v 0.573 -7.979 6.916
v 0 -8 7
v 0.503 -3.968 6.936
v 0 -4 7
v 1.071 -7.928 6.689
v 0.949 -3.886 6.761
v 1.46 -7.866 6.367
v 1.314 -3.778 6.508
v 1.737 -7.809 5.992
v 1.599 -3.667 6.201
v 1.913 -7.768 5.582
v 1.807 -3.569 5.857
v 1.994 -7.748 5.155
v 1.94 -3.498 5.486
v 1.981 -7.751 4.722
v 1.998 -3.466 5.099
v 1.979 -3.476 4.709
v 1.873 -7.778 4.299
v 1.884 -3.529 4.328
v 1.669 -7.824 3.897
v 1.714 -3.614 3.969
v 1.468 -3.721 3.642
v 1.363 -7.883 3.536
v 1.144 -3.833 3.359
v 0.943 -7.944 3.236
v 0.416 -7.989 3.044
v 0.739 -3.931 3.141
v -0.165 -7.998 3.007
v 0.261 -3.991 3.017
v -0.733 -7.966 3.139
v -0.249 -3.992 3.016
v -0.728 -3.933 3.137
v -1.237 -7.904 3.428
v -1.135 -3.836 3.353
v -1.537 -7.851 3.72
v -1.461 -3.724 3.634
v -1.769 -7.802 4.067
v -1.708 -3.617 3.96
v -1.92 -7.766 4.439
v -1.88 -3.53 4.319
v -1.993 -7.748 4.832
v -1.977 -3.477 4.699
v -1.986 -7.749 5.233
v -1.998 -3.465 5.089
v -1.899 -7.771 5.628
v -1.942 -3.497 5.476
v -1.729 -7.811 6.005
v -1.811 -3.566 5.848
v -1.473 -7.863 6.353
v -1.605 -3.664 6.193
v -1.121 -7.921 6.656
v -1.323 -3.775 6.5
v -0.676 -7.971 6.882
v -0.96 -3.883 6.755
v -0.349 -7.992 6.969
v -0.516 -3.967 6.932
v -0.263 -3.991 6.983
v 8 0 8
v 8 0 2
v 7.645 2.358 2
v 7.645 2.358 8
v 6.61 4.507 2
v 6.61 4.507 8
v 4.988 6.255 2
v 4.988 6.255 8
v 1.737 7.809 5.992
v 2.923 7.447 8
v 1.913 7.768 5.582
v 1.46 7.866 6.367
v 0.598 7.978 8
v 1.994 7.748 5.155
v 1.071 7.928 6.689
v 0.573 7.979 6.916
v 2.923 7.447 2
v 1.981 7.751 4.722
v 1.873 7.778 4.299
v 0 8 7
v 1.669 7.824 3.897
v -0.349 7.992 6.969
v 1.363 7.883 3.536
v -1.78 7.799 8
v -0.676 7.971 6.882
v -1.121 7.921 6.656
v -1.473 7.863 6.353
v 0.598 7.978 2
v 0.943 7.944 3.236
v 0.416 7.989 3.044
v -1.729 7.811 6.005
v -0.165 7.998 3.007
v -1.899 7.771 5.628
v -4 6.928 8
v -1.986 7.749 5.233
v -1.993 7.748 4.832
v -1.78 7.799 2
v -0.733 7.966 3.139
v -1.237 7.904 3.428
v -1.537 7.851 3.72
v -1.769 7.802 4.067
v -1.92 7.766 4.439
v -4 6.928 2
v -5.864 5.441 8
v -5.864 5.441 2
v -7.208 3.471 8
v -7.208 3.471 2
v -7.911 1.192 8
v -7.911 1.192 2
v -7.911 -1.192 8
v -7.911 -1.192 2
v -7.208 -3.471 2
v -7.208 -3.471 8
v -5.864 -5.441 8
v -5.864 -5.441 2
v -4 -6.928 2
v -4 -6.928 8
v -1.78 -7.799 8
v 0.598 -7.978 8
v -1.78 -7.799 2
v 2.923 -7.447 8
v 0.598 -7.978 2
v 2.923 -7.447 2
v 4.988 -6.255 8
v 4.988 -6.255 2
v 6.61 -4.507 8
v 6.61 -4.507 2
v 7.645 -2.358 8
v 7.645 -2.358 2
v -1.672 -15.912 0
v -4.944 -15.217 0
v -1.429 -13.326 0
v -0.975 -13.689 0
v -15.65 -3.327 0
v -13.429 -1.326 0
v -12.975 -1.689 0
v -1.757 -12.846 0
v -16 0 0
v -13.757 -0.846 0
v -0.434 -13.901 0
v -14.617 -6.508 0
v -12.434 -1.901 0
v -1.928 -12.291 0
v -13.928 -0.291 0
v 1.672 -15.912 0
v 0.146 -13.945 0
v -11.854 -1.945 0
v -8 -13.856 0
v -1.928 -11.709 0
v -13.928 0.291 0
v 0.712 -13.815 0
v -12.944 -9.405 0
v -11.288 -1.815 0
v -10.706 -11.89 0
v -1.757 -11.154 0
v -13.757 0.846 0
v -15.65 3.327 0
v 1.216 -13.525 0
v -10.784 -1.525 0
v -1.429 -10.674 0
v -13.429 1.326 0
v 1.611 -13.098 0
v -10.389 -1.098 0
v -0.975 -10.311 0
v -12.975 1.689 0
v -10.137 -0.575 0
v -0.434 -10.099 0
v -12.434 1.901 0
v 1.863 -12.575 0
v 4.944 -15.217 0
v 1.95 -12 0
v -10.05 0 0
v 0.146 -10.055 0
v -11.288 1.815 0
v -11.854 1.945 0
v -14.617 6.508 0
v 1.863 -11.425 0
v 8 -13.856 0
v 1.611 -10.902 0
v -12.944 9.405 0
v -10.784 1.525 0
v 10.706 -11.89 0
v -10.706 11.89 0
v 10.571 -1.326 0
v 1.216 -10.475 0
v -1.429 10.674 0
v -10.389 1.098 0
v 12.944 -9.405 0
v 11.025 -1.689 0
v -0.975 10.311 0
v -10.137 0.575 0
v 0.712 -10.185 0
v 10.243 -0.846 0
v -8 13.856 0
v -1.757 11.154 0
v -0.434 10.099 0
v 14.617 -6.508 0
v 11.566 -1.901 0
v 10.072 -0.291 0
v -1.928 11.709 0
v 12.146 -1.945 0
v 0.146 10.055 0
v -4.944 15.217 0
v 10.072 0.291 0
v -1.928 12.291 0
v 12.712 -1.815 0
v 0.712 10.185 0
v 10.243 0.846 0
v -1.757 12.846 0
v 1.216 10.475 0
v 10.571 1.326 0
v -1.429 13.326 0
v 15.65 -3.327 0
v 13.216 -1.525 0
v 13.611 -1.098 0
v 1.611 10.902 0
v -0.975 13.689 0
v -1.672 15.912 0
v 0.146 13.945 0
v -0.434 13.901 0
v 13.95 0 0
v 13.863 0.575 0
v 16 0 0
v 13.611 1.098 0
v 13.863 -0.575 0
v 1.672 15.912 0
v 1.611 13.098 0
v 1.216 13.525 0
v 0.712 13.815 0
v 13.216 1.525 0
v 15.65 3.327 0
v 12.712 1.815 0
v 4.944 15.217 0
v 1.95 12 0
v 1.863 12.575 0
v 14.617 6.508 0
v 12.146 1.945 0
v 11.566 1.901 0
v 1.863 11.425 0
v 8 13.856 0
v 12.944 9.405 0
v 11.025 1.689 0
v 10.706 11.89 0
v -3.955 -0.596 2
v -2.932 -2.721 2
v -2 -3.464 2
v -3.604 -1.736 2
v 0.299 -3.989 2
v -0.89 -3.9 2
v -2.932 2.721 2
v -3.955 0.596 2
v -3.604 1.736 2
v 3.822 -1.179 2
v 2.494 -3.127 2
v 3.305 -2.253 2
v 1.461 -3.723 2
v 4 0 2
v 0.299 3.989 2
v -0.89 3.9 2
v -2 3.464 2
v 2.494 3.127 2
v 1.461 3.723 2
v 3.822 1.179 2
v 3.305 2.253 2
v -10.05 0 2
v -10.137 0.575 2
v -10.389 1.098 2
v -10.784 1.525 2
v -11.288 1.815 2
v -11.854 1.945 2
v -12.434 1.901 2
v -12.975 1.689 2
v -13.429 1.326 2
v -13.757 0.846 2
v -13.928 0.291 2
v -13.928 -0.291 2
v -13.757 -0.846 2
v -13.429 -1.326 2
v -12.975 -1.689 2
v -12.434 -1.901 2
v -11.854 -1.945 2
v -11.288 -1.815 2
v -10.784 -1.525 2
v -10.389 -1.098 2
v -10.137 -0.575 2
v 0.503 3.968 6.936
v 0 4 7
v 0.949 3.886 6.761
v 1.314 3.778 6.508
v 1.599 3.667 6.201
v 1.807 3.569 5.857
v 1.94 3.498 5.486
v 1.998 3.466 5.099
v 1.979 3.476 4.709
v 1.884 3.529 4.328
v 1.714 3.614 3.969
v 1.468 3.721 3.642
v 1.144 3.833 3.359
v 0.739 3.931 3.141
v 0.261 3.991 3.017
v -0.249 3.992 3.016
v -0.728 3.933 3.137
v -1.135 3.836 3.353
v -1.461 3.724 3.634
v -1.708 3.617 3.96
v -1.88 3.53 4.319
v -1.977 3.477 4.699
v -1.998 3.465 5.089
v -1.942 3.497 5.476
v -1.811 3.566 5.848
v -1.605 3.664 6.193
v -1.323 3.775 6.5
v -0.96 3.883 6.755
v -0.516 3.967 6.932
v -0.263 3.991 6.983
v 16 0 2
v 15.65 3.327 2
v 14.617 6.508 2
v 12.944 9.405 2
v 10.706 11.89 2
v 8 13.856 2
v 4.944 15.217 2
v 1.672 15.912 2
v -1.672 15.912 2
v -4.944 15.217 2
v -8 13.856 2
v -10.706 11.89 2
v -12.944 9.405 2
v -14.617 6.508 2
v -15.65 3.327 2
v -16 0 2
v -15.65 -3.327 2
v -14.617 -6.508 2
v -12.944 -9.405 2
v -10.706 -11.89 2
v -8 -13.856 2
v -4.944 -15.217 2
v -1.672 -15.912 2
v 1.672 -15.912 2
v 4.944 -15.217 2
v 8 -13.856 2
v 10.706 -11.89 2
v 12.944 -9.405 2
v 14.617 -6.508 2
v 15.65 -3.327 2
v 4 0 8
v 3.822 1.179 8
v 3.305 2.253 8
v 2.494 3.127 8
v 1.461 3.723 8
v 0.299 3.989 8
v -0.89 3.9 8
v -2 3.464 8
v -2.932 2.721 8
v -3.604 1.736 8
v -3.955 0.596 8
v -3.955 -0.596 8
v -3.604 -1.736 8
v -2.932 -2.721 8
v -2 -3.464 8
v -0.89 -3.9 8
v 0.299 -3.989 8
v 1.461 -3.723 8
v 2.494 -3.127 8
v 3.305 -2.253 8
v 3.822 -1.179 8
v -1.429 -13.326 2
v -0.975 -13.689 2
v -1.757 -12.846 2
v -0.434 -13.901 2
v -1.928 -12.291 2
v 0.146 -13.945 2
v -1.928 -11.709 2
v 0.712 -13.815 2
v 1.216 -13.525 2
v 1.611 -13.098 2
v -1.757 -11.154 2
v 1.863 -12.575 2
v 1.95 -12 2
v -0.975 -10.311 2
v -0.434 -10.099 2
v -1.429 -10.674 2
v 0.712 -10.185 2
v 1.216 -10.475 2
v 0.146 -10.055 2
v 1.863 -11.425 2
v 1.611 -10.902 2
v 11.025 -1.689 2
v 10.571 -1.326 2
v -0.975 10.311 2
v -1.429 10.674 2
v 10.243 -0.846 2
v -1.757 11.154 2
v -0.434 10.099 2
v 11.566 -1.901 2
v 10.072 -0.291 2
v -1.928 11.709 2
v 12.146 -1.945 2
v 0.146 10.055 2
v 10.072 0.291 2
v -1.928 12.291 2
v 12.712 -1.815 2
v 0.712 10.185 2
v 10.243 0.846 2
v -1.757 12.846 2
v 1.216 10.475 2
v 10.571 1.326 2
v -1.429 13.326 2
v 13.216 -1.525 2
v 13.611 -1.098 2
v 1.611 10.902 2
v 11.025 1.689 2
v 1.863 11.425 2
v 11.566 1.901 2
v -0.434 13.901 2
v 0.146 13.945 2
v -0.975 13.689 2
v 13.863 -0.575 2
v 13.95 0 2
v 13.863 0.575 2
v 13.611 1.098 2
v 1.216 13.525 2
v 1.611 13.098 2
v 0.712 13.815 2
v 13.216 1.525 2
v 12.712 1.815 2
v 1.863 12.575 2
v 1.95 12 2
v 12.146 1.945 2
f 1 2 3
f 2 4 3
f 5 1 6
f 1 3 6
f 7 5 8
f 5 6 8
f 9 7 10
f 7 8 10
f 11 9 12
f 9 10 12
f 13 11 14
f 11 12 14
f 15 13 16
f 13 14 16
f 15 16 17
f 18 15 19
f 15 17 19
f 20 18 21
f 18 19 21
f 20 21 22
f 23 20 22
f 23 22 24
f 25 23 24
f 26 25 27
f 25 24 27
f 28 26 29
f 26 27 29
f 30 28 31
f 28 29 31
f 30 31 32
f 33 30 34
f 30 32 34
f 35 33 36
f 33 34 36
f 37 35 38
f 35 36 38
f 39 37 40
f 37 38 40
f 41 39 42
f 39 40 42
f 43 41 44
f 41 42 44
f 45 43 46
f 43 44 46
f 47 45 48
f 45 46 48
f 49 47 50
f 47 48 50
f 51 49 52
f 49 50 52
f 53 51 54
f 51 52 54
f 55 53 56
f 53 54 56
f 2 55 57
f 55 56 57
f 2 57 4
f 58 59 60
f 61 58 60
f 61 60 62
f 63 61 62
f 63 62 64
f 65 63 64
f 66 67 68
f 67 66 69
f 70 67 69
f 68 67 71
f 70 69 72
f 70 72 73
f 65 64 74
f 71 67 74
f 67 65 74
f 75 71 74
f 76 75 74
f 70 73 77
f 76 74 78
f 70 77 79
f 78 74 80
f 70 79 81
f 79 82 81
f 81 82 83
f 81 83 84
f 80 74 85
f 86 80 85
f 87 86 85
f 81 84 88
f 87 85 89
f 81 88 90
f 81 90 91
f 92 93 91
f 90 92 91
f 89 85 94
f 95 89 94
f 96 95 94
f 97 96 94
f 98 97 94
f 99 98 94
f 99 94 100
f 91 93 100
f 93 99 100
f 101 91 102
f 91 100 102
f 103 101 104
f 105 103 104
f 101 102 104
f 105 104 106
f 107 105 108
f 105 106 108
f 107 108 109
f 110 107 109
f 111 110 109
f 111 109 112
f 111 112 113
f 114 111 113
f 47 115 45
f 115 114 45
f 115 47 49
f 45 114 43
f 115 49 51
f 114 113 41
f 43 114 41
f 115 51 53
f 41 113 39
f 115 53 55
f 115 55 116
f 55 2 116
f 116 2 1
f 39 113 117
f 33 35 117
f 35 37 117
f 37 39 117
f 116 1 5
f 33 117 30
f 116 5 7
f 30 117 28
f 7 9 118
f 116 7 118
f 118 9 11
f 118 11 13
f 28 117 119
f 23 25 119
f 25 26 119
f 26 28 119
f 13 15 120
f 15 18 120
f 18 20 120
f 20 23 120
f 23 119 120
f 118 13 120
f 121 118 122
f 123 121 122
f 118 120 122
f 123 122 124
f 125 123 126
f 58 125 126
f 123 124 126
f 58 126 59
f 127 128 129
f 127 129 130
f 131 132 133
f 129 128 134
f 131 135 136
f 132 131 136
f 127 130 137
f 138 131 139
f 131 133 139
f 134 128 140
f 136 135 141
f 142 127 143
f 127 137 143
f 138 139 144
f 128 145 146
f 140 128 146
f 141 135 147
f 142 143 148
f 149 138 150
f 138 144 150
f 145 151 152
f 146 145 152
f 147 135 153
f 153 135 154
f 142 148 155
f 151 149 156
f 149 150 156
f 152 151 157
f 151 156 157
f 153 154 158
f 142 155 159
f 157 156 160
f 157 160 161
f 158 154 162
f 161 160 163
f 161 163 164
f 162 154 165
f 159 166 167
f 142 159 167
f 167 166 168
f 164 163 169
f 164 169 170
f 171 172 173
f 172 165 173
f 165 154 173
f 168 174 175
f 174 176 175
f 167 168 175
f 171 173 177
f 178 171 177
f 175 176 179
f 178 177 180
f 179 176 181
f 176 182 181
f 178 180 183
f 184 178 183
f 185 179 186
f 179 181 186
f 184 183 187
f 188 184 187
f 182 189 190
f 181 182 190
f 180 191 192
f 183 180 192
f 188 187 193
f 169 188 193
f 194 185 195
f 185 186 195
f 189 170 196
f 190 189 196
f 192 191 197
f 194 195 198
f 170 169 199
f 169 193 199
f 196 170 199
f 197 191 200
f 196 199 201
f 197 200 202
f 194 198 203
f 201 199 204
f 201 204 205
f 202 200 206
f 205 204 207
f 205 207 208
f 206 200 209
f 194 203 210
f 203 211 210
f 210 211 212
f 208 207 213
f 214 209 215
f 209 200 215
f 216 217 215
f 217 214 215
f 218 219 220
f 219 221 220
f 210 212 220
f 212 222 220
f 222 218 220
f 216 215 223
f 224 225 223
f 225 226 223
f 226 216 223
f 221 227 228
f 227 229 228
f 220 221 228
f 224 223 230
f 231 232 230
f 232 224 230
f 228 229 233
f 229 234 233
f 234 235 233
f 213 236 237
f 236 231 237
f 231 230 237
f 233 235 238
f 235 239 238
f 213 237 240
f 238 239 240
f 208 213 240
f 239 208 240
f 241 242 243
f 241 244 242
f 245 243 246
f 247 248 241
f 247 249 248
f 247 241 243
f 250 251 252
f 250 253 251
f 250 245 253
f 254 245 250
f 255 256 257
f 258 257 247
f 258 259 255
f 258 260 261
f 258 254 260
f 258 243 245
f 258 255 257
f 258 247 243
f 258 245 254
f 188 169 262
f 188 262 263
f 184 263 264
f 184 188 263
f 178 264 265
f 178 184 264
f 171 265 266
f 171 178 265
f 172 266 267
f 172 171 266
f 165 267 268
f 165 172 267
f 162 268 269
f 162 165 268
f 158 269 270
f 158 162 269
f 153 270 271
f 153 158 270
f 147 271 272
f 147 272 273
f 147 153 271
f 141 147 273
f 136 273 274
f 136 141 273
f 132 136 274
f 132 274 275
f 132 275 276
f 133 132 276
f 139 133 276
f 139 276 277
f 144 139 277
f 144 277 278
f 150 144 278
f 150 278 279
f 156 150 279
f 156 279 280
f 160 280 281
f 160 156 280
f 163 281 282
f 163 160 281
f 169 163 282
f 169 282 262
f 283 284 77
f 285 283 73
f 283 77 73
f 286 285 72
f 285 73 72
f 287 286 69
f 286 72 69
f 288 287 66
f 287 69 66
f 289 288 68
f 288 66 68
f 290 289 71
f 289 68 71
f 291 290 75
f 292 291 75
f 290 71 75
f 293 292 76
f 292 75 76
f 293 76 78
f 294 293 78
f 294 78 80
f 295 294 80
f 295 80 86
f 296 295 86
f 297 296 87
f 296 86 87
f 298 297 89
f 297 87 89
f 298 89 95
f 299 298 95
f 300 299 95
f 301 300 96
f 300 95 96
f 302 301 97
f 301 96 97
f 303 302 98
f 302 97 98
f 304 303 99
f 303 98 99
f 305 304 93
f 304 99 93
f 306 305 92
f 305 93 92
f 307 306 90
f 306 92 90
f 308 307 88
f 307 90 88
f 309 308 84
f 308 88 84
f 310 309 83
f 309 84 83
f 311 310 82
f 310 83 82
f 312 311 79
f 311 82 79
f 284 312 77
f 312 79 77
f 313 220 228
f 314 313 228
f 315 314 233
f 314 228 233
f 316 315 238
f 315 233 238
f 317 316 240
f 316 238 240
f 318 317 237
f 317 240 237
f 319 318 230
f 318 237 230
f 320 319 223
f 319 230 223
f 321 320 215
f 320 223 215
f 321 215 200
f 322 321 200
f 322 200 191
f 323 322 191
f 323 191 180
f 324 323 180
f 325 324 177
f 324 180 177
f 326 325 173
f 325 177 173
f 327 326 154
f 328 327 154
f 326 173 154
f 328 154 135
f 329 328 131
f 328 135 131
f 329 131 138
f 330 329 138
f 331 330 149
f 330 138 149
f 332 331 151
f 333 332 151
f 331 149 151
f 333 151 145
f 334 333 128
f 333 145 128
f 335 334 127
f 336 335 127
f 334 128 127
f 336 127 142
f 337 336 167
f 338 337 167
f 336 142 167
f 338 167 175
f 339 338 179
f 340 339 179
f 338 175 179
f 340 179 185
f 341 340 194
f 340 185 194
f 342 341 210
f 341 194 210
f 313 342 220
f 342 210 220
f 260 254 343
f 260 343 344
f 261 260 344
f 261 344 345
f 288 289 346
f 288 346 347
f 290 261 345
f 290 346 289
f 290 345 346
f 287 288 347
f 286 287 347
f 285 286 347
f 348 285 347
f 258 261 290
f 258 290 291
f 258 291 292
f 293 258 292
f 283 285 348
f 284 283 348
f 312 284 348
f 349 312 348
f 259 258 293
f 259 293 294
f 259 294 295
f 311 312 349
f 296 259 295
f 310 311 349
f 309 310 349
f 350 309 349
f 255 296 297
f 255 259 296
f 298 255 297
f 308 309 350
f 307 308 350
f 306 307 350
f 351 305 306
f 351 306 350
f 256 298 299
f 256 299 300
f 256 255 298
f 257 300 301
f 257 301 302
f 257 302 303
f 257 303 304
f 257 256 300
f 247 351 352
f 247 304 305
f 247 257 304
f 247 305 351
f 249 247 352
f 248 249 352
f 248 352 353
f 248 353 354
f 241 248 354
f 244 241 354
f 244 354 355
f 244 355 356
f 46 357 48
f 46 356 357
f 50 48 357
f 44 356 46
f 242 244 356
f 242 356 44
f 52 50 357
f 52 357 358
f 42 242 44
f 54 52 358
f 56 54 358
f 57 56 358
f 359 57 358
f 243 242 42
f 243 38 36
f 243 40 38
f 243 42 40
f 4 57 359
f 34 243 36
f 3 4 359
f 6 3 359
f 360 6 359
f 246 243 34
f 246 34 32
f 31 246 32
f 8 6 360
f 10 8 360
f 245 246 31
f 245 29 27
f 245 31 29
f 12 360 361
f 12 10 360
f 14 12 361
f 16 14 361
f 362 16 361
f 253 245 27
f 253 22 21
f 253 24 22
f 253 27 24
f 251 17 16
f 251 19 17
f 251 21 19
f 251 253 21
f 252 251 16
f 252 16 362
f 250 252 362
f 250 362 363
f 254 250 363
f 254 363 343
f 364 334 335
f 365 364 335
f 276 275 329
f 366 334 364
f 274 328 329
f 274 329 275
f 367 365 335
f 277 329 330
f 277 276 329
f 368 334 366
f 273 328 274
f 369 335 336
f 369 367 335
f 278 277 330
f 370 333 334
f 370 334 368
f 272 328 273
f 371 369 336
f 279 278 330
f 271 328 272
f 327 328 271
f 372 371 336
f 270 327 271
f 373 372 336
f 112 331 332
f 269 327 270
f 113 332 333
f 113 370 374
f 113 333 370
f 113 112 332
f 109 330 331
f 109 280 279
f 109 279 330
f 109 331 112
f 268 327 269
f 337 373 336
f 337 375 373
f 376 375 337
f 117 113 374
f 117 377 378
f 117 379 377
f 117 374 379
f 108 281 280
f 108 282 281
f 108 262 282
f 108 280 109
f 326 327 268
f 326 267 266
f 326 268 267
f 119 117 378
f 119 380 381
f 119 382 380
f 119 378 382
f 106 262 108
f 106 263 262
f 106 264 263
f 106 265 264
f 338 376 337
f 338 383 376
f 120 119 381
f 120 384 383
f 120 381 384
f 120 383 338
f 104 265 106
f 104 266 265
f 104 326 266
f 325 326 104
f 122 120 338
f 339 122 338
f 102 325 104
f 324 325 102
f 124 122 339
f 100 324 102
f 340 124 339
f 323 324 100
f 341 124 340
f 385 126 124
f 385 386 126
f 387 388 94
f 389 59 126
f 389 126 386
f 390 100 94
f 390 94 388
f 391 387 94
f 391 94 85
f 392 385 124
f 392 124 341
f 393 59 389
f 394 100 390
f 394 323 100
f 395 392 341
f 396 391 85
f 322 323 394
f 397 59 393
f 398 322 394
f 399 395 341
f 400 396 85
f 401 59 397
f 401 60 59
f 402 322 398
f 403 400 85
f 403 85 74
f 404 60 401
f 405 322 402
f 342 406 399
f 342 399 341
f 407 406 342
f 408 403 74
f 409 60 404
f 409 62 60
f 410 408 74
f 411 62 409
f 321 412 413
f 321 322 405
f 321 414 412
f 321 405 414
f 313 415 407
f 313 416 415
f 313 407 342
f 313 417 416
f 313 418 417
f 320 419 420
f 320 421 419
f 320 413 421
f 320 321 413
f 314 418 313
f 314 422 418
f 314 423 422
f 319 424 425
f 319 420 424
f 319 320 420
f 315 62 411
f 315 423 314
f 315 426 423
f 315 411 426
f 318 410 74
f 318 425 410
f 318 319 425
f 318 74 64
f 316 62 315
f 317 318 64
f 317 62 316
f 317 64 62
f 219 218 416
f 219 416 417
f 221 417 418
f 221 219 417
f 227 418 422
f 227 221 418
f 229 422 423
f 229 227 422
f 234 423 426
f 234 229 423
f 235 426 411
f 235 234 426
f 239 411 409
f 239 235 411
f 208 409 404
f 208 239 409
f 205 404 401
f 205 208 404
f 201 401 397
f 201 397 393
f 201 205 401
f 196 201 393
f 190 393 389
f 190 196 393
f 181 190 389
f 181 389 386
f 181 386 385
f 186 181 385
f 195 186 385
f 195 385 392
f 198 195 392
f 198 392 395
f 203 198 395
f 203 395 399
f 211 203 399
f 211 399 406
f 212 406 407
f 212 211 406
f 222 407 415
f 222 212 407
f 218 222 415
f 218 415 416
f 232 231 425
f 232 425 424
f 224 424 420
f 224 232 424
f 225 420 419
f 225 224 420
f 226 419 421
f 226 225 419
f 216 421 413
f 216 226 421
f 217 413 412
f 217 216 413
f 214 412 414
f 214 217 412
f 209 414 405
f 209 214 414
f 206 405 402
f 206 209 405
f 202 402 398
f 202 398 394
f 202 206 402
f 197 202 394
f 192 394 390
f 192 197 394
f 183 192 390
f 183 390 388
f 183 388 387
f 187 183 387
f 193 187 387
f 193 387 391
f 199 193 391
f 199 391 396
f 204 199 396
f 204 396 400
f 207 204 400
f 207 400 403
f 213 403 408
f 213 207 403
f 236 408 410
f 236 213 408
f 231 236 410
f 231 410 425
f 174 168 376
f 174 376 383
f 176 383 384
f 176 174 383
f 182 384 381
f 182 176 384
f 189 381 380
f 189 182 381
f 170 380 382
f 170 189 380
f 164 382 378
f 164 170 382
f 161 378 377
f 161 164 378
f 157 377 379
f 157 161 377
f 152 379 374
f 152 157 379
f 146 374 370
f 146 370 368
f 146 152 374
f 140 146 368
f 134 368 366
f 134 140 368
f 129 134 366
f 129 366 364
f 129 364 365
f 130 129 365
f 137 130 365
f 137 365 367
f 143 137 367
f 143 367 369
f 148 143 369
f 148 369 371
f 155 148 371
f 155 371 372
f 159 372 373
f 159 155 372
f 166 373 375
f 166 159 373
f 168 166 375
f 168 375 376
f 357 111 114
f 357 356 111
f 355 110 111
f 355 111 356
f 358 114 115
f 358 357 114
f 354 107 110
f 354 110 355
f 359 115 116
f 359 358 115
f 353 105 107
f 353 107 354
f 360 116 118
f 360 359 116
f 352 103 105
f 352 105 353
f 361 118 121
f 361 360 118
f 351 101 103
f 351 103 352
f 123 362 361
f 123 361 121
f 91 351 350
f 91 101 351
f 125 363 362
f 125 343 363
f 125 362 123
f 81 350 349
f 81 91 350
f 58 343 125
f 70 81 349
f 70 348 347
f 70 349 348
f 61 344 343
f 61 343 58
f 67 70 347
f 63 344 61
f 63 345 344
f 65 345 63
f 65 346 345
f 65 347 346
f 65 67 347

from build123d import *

# Parameters (mm, degrees)
SKETCH1_R           = 8
SKETCH1_R_2         = 4
BOSS_EXTRUDE1_DEPTH = 8
SKETCH2_R           = 16
SKETCH2_R_2         = 1.95
BOSS_EXTRUDE2_DEPTH = 2
SKETCH3_R           = 2
CUT_EXTRUDE1_DEPTH  = 10


with BuildPart() as part:
    # Sketch1 → Boss-Extrude1 (new body)
    with BuildSketch(Plane.XY):
        Circle(SKETCH1_R)
        Circle(SKETCH1_R_2, mode=Mode.SUBTRACT)
    extrude(amount=BOSS_EXTRUDE1_DEPTH)

    # Sketch2 → Boss-Extrude2 (add)
    with BuildSketch(Plane.XY):
        Circle(SKETCH2_R)
        with Locations((12, 0)):
            Circle(SKETCH2_R_2, mode=Mode.SUBTRACT)
        with Locations((0, -12)):
            Circle(SKETCH2_R_2, mode=Mode.SUBTRACT)
        with Locations((-12, 0)):
            Circle(SKETCH2_R_2, mode=Mode.SUBTRACT)
        with Locations((0, 12)):
            Circle(SKETCH2_R_2, mode=Mode.SUBTRACT)
    extrude(amount=BOSS_EXTRUDE2_DEPTH)

    # Sketch3 → Cut-Extrude1 (cut, symmetric)
    with BuildSketch(Plane(origin=(0, 0, 0), x_dir=(1, 0, 0), z_dir=(0, 1, 0))):
        with Locations(Location((0, -5, 0), (0, 0, 270))):
            Circle(SKETCH3_R)
    extrude(amount=CUT_EXTRUDE1_DEPTH, both=True, mode=Mode.SUBTRACT)


solid = part.part
